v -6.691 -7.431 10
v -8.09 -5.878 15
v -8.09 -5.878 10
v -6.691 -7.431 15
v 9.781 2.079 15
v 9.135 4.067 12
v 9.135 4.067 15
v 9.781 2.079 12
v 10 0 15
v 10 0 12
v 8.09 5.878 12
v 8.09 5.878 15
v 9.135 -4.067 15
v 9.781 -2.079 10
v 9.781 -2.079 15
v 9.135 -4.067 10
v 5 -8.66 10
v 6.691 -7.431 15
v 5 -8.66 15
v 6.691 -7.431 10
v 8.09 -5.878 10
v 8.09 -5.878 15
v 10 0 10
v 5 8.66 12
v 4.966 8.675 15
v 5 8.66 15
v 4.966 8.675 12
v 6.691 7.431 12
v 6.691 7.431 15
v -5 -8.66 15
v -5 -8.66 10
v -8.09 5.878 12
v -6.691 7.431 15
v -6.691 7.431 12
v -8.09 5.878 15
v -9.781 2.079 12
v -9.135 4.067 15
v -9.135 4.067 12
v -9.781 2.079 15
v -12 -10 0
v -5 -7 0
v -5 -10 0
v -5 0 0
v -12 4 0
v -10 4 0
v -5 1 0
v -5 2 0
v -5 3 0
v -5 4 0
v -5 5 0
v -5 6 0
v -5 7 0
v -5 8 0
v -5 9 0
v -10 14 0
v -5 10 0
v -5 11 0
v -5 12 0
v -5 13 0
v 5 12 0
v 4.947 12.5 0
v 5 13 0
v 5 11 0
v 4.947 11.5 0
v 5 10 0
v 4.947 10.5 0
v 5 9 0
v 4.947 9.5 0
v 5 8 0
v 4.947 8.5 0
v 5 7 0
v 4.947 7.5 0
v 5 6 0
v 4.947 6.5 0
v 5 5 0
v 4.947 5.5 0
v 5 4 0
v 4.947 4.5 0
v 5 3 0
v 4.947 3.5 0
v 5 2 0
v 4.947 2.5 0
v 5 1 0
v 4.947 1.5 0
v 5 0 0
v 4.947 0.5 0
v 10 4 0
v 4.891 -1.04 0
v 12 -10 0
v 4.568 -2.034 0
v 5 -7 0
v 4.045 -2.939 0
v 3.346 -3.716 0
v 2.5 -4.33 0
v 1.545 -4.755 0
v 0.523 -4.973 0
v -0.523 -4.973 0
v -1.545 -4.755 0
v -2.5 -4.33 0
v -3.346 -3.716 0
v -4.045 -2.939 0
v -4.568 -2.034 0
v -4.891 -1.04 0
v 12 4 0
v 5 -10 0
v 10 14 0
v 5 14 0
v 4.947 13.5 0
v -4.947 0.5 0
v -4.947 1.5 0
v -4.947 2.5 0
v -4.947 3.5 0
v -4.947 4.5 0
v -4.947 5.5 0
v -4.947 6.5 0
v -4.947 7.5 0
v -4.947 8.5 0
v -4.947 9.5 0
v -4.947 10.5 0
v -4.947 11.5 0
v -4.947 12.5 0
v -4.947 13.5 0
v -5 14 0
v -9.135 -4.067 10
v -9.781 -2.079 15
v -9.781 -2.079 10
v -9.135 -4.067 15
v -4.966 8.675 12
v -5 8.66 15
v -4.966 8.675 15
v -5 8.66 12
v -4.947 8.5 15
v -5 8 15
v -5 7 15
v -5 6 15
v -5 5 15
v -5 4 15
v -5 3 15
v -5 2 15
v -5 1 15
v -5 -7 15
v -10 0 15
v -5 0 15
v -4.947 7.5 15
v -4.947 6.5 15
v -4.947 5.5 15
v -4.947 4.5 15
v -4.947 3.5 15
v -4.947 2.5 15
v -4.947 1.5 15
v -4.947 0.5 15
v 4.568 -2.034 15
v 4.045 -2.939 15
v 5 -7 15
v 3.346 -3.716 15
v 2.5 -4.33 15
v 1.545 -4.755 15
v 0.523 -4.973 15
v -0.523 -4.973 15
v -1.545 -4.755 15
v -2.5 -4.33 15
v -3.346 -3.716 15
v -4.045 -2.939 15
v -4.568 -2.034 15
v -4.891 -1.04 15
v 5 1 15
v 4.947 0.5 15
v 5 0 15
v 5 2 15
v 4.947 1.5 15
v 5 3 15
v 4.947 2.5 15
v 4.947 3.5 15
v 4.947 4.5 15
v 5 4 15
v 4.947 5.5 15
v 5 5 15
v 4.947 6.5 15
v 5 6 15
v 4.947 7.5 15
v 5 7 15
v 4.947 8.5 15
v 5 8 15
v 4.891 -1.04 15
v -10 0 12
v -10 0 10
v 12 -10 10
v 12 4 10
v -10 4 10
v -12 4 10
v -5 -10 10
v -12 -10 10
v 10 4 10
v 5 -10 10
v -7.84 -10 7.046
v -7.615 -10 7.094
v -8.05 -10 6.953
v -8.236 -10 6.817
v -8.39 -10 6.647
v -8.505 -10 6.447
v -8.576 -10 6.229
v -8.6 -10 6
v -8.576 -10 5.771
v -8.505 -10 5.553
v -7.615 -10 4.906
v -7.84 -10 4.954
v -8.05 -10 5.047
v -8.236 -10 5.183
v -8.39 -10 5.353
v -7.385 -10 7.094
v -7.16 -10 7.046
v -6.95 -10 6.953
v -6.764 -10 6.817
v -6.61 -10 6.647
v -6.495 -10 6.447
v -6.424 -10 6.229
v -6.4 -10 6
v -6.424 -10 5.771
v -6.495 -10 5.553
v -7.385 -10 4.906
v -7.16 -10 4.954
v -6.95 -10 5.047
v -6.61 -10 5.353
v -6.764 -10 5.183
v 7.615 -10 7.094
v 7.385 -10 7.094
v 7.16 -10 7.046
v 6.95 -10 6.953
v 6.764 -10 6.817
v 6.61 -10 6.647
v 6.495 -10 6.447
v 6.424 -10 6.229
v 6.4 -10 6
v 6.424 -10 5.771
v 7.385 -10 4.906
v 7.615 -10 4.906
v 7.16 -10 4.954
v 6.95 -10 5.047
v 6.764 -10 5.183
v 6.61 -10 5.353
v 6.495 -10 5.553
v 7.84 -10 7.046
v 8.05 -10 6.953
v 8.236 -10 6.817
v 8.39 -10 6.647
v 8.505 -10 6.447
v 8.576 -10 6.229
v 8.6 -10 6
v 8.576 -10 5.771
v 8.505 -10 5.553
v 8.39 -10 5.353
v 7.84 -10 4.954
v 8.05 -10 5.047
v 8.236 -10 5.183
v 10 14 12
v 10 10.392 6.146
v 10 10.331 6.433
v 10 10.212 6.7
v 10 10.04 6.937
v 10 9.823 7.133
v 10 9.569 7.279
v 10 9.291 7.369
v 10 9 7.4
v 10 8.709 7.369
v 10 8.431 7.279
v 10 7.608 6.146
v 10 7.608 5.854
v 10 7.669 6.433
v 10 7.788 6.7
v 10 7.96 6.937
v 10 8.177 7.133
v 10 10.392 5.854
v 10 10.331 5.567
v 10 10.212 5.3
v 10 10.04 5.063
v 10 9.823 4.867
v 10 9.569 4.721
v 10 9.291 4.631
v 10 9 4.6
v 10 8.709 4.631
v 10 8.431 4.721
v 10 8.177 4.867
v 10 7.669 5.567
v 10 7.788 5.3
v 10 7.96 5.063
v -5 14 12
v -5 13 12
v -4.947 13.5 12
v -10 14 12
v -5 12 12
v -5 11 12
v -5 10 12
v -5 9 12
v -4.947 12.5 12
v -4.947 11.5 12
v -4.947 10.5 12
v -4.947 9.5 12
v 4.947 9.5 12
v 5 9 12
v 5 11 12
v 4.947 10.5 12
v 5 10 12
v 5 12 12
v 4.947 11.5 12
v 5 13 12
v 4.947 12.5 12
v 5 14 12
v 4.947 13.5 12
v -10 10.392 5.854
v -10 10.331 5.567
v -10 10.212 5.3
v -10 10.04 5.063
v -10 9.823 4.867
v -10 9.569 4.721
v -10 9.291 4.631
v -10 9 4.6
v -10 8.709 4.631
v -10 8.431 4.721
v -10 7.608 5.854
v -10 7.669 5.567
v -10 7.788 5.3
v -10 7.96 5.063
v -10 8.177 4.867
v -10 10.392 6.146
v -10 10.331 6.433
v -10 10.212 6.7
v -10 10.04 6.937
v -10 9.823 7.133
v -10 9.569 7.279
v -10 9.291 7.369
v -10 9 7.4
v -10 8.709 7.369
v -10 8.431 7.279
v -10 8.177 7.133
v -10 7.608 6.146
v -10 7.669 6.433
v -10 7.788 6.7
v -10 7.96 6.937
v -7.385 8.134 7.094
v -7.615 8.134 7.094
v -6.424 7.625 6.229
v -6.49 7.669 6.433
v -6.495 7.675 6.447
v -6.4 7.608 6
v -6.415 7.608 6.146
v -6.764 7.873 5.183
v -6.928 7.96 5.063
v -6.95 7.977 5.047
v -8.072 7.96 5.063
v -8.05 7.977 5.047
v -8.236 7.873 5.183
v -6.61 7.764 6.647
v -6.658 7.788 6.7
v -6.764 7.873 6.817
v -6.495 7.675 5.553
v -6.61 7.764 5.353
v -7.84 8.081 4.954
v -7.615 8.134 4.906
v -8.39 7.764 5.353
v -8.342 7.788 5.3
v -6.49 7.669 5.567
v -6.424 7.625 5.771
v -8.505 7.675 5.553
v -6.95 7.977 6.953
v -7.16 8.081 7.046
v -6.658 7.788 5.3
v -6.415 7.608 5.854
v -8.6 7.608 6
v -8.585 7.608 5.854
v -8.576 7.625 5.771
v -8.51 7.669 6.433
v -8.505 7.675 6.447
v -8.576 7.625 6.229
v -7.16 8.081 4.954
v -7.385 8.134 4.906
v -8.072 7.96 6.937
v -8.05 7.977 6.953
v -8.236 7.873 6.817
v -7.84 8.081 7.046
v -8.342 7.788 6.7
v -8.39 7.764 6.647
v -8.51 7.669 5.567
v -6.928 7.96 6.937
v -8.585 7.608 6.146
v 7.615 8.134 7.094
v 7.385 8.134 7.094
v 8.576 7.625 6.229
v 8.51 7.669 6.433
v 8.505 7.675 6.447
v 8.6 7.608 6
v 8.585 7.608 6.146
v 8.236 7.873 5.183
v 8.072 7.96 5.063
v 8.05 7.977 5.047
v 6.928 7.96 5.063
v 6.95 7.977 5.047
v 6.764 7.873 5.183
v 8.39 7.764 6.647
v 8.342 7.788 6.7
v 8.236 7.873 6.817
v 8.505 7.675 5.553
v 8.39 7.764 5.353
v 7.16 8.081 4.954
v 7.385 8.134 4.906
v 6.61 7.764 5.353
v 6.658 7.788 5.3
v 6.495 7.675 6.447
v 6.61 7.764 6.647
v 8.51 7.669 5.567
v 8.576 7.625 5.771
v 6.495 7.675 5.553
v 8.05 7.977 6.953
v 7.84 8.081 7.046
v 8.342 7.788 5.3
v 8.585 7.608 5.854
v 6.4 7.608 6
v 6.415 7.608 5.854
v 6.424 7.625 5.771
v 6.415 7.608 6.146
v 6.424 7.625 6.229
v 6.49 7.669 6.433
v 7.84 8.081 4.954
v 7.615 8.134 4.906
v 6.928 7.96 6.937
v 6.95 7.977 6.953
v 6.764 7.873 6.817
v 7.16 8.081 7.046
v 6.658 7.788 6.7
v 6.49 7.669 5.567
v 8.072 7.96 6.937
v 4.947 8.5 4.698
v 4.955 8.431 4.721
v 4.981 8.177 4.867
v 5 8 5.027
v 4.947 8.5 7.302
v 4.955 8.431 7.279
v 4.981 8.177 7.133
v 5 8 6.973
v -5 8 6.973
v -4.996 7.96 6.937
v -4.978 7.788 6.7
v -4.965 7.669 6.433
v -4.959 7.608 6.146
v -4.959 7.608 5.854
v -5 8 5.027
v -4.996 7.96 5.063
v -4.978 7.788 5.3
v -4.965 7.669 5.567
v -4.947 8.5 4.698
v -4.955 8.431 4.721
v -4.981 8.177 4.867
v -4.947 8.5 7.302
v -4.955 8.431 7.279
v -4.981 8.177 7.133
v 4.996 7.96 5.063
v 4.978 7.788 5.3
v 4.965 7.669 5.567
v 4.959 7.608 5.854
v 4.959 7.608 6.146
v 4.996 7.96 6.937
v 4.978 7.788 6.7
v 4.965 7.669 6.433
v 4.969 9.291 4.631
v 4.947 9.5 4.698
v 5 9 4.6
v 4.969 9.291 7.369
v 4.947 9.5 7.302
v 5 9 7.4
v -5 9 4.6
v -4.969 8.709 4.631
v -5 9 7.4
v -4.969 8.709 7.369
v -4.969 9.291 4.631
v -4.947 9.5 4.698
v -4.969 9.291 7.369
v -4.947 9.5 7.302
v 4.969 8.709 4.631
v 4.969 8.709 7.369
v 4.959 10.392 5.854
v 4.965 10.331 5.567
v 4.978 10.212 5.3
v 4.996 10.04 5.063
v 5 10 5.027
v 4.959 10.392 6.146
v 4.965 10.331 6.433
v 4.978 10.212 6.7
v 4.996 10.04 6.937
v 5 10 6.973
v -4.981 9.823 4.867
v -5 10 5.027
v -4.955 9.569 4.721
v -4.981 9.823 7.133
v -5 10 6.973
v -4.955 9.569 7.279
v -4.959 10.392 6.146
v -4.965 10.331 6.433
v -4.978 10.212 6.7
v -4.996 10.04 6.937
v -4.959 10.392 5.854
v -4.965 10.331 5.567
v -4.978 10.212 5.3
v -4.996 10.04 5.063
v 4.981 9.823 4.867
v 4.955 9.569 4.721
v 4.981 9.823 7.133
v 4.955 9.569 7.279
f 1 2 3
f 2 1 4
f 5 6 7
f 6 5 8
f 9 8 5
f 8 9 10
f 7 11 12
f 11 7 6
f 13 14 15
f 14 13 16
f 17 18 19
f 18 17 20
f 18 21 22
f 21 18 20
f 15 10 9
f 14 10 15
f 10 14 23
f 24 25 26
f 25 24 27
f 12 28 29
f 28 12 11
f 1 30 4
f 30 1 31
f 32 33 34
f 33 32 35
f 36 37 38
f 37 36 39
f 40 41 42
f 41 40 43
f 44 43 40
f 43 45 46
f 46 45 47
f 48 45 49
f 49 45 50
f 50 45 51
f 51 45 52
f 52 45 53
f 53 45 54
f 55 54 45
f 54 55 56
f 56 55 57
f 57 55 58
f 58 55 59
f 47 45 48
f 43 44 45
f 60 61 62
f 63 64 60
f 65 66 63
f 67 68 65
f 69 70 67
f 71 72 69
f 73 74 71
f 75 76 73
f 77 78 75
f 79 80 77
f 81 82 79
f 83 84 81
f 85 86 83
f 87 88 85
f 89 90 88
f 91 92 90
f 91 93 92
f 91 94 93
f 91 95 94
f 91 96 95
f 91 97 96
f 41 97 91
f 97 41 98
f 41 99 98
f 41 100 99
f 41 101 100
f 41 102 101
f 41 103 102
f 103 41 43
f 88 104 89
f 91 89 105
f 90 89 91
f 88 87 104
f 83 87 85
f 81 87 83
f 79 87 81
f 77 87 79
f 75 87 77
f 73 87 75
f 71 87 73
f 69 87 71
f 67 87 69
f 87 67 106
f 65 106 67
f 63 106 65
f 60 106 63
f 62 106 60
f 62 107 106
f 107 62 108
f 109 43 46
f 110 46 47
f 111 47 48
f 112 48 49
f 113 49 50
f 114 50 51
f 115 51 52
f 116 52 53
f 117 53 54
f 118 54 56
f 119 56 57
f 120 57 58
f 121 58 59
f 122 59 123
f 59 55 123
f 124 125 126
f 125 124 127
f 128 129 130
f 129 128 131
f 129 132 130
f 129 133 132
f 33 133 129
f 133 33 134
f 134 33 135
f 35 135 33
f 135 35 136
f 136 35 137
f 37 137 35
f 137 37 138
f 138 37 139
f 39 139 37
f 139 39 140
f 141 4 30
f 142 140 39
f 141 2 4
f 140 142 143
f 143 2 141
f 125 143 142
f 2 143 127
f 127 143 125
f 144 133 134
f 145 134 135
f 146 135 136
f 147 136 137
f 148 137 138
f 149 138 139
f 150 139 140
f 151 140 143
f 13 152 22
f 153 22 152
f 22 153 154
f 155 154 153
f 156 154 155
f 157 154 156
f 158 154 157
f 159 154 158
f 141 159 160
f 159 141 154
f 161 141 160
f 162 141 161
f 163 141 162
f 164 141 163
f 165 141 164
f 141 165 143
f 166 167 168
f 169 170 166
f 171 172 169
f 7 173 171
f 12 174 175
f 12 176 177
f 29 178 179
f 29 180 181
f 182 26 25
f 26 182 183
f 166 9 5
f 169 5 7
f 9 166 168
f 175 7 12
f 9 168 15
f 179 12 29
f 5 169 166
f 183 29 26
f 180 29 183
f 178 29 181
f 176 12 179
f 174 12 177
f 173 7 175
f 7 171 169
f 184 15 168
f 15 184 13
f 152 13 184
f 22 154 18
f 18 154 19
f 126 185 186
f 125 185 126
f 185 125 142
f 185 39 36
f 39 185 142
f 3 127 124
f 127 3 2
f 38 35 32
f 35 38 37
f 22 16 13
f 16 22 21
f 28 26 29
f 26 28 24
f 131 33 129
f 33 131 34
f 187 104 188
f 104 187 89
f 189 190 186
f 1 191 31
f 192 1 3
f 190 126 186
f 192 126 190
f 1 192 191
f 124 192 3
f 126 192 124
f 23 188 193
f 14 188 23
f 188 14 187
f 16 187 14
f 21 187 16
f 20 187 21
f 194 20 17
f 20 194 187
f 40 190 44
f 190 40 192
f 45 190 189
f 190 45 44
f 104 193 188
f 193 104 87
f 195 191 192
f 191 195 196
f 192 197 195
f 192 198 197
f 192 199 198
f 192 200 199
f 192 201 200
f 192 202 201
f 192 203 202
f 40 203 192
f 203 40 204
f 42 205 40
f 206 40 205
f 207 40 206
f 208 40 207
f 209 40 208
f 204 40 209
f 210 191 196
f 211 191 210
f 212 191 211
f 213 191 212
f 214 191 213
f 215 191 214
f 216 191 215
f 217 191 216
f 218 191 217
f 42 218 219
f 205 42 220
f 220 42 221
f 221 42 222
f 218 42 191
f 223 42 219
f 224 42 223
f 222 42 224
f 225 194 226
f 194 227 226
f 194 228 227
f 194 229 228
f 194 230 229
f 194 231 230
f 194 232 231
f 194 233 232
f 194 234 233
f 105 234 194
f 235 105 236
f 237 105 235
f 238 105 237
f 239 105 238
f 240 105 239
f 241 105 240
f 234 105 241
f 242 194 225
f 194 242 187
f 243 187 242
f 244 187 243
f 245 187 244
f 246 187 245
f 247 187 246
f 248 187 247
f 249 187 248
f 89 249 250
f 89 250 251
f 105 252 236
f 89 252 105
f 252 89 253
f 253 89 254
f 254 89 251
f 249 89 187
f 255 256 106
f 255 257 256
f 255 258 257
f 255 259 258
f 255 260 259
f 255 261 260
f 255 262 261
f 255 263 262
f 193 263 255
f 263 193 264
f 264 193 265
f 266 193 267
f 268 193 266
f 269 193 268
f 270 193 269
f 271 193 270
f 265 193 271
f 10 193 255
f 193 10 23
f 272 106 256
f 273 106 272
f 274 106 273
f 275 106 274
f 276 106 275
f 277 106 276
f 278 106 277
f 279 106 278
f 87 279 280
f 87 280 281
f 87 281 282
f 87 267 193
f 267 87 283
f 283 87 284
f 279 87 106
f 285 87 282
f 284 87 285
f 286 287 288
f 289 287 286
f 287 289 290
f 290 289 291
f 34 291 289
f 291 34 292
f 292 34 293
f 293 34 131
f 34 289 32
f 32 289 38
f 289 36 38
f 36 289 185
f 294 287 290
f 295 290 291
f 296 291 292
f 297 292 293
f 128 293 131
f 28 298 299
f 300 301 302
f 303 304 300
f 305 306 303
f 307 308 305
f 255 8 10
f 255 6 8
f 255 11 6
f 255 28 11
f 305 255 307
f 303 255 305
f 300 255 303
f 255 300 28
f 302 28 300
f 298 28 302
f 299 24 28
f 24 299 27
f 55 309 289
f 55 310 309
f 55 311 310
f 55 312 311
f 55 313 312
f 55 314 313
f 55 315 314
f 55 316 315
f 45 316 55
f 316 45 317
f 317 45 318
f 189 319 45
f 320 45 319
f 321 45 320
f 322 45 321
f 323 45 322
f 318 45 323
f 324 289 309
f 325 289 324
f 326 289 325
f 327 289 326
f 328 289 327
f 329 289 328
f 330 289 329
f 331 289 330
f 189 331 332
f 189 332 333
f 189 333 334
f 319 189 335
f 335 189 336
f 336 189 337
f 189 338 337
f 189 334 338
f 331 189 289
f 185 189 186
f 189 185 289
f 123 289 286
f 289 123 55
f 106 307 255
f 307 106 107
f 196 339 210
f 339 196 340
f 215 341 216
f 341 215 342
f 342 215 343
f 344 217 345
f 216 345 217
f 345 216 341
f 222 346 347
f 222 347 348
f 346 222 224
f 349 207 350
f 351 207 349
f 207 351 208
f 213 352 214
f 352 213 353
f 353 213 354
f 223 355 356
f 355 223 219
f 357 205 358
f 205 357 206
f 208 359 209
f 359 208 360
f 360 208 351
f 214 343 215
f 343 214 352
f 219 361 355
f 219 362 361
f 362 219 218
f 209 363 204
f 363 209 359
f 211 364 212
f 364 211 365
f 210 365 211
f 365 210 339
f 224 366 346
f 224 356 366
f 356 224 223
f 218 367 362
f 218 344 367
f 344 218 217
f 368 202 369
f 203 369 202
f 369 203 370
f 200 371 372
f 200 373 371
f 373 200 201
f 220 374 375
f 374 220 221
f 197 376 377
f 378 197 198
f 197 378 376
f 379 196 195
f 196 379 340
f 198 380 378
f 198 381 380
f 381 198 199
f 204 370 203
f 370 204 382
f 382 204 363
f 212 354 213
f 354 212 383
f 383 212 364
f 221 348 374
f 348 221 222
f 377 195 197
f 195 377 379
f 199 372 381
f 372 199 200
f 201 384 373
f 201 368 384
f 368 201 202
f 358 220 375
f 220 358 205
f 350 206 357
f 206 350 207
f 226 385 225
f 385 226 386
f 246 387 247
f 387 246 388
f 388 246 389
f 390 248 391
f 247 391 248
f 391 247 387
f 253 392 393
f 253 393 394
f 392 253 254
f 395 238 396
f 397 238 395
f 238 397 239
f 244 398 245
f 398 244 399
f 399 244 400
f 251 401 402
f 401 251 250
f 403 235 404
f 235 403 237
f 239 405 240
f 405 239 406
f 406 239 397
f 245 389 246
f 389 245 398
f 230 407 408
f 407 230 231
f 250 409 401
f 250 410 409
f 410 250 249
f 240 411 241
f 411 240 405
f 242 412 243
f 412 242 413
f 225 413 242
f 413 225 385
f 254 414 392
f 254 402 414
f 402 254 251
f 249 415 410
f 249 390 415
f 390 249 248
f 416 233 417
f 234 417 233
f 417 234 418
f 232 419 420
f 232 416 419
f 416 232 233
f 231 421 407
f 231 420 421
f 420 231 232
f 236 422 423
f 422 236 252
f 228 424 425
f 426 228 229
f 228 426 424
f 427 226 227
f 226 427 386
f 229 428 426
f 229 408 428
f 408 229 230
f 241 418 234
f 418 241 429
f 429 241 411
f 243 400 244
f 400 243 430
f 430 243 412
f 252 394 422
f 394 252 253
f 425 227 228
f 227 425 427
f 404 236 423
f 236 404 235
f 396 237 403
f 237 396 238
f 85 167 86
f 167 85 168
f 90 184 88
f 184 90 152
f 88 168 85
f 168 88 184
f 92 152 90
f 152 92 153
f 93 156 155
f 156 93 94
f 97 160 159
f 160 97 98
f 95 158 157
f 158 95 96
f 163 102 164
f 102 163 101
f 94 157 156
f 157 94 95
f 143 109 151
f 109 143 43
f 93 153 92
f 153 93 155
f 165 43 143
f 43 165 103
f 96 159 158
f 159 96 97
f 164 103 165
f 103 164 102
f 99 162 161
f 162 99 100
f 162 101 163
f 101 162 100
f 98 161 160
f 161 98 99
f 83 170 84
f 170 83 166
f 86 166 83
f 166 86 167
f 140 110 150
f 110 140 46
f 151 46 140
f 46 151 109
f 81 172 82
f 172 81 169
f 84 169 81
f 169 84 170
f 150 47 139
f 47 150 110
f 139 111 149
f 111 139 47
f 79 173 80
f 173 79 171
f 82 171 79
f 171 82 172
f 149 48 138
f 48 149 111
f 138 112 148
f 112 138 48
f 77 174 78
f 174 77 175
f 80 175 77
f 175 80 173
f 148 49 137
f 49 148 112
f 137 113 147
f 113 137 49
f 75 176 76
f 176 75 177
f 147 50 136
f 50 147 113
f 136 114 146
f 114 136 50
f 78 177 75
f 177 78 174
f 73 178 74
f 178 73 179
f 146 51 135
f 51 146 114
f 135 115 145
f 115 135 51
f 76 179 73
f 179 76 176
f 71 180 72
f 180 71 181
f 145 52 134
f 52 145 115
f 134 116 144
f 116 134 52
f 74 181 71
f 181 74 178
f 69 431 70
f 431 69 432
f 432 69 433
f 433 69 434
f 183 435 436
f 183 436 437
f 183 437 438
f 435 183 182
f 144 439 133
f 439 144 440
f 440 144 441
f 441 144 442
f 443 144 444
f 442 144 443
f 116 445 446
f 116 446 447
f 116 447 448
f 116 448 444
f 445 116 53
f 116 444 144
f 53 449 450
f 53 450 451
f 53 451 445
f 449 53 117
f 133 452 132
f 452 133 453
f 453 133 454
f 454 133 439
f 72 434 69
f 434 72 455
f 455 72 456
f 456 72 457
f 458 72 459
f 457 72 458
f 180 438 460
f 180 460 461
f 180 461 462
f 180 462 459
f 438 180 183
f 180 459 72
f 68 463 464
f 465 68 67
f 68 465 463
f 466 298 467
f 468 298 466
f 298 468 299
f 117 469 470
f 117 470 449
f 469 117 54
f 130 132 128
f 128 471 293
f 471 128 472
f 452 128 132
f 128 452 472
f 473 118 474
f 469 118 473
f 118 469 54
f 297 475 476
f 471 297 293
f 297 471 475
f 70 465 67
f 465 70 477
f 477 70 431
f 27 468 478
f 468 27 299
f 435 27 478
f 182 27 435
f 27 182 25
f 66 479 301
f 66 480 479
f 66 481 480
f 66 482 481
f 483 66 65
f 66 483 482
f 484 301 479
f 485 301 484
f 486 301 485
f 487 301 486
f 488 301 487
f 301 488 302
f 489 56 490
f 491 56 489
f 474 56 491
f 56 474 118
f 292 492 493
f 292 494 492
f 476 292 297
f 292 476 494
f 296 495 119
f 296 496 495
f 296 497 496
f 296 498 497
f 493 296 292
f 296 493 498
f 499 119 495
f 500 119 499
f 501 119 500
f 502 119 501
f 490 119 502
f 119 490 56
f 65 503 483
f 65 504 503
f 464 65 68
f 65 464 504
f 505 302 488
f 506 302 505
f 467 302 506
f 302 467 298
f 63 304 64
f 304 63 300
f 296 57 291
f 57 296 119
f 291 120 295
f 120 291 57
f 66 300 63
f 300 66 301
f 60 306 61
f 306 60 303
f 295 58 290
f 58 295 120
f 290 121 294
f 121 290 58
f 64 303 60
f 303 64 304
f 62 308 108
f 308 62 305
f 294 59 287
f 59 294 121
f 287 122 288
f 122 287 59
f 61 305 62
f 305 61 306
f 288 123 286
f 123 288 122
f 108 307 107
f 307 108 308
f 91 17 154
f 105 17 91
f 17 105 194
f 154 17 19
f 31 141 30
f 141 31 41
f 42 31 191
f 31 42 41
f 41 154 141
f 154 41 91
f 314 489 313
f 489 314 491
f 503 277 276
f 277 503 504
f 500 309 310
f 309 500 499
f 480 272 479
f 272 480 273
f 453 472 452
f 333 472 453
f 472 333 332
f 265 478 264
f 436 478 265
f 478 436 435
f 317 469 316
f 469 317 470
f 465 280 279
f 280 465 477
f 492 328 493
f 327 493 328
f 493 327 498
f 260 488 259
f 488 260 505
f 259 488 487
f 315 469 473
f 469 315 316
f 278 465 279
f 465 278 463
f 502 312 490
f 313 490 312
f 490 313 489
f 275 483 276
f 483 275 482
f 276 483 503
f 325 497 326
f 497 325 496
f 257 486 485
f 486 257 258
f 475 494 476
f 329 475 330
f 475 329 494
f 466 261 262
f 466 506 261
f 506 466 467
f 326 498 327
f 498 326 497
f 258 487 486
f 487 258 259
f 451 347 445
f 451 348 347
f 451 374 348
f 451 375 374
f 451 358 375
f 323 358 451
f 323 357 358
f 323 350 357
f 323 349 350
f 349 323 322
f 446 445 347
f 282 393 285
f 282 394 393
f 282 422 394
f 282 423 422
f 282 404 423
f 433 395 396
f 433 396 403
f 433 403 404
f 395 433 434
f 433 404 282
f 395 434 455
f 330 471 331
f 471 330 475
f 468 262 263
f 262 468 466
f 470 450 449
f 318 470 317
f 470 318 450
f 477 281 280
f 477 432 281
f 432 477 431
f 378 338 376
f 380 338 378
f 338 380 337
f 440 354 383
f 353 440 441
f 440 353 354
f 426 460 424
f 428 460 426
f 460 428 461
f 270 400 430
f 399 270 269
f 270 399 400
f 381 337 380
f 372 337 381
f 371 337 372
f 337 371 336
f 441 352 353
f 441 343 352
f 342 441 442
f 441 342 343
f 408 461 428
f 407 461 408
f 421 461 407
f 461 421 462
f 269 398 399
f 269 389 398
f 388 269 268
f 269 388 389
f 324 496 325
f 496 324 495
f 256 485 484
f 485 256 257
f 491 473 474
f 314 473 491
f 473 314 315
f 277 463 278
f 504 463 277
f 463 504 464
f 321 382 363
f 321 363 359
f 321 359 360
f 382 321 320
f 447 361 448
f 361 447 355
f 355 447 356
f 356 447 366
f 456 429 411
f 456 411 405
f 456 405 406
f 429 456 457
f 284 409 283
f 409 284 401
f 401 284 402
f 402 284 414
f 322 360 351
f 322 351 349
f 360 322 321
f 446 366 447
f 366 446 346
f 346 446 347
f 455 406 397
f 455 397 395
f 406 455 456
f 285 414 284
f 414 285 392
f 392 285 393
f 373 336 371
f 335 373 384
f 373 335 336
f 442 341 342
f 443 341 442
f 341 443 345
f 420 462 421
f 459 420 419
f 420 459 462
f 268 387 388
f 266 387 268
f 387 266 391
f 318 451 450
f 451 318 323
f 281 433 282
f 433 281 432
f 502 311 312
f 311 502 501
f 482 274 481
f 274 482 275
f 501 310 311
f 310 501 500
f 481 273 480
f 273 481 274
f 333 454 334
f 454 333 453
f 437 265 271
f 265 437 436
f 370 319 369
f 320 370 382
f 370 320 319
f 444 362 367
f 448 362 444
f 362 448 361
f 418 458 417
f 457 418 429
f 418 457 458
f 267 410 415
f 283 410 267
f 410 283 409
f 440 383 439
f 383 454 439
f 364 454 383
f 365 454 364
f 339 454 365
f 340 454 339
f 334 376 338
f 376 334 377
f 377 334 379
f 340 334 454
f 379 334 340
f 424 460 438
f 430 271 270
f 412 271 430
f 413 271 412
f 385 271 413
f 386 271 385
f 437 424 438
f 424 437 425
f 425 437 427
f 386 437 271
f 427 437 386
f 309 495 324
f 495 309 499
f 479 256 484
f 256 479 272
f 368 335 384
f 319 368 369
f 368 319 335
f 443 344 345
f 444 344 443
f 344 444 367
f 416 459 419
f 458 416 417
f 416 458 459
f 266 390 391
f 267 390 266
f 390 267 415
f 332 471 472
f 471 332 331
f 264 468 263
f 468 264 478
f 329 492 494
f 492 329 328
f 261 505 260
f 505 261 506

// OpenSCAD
levelsensor_mount();
//color("lightblue")translate([0,0,-10])cylinder(r=10/2,h=100,$fn=30);
//flashtree rain water level sensor
module levelsensor_mount(){
difference(){
union(){
cylinder(r=(10+10)/2,h=15,$fn=30);
translate([-12,-10,0])cube([20+4,14,10]);
translate([-10,0,0])cube([20,14,12]);
}
translate([-12+7,-21,0])#cube([10,14,15]);
translate([12.5,0,0]){
translate([-20,9,6])rotate([90,0,0])#cylinder(r=2.2/2,h=300,$fn=30);
translate([-20+15,9,6])rotate([90,0,0])#cylinder(r=2.2/2,h=300,$fn=30);
}

translate([-20,9,6])rotate([0,90,0])#cylinder(r=2.8/2,h=300,$fn=30);
for(i=[0:20]){
translate([0,i,-2])cylinder(r=10/2,h=100,$fn=30);
}
}
}
